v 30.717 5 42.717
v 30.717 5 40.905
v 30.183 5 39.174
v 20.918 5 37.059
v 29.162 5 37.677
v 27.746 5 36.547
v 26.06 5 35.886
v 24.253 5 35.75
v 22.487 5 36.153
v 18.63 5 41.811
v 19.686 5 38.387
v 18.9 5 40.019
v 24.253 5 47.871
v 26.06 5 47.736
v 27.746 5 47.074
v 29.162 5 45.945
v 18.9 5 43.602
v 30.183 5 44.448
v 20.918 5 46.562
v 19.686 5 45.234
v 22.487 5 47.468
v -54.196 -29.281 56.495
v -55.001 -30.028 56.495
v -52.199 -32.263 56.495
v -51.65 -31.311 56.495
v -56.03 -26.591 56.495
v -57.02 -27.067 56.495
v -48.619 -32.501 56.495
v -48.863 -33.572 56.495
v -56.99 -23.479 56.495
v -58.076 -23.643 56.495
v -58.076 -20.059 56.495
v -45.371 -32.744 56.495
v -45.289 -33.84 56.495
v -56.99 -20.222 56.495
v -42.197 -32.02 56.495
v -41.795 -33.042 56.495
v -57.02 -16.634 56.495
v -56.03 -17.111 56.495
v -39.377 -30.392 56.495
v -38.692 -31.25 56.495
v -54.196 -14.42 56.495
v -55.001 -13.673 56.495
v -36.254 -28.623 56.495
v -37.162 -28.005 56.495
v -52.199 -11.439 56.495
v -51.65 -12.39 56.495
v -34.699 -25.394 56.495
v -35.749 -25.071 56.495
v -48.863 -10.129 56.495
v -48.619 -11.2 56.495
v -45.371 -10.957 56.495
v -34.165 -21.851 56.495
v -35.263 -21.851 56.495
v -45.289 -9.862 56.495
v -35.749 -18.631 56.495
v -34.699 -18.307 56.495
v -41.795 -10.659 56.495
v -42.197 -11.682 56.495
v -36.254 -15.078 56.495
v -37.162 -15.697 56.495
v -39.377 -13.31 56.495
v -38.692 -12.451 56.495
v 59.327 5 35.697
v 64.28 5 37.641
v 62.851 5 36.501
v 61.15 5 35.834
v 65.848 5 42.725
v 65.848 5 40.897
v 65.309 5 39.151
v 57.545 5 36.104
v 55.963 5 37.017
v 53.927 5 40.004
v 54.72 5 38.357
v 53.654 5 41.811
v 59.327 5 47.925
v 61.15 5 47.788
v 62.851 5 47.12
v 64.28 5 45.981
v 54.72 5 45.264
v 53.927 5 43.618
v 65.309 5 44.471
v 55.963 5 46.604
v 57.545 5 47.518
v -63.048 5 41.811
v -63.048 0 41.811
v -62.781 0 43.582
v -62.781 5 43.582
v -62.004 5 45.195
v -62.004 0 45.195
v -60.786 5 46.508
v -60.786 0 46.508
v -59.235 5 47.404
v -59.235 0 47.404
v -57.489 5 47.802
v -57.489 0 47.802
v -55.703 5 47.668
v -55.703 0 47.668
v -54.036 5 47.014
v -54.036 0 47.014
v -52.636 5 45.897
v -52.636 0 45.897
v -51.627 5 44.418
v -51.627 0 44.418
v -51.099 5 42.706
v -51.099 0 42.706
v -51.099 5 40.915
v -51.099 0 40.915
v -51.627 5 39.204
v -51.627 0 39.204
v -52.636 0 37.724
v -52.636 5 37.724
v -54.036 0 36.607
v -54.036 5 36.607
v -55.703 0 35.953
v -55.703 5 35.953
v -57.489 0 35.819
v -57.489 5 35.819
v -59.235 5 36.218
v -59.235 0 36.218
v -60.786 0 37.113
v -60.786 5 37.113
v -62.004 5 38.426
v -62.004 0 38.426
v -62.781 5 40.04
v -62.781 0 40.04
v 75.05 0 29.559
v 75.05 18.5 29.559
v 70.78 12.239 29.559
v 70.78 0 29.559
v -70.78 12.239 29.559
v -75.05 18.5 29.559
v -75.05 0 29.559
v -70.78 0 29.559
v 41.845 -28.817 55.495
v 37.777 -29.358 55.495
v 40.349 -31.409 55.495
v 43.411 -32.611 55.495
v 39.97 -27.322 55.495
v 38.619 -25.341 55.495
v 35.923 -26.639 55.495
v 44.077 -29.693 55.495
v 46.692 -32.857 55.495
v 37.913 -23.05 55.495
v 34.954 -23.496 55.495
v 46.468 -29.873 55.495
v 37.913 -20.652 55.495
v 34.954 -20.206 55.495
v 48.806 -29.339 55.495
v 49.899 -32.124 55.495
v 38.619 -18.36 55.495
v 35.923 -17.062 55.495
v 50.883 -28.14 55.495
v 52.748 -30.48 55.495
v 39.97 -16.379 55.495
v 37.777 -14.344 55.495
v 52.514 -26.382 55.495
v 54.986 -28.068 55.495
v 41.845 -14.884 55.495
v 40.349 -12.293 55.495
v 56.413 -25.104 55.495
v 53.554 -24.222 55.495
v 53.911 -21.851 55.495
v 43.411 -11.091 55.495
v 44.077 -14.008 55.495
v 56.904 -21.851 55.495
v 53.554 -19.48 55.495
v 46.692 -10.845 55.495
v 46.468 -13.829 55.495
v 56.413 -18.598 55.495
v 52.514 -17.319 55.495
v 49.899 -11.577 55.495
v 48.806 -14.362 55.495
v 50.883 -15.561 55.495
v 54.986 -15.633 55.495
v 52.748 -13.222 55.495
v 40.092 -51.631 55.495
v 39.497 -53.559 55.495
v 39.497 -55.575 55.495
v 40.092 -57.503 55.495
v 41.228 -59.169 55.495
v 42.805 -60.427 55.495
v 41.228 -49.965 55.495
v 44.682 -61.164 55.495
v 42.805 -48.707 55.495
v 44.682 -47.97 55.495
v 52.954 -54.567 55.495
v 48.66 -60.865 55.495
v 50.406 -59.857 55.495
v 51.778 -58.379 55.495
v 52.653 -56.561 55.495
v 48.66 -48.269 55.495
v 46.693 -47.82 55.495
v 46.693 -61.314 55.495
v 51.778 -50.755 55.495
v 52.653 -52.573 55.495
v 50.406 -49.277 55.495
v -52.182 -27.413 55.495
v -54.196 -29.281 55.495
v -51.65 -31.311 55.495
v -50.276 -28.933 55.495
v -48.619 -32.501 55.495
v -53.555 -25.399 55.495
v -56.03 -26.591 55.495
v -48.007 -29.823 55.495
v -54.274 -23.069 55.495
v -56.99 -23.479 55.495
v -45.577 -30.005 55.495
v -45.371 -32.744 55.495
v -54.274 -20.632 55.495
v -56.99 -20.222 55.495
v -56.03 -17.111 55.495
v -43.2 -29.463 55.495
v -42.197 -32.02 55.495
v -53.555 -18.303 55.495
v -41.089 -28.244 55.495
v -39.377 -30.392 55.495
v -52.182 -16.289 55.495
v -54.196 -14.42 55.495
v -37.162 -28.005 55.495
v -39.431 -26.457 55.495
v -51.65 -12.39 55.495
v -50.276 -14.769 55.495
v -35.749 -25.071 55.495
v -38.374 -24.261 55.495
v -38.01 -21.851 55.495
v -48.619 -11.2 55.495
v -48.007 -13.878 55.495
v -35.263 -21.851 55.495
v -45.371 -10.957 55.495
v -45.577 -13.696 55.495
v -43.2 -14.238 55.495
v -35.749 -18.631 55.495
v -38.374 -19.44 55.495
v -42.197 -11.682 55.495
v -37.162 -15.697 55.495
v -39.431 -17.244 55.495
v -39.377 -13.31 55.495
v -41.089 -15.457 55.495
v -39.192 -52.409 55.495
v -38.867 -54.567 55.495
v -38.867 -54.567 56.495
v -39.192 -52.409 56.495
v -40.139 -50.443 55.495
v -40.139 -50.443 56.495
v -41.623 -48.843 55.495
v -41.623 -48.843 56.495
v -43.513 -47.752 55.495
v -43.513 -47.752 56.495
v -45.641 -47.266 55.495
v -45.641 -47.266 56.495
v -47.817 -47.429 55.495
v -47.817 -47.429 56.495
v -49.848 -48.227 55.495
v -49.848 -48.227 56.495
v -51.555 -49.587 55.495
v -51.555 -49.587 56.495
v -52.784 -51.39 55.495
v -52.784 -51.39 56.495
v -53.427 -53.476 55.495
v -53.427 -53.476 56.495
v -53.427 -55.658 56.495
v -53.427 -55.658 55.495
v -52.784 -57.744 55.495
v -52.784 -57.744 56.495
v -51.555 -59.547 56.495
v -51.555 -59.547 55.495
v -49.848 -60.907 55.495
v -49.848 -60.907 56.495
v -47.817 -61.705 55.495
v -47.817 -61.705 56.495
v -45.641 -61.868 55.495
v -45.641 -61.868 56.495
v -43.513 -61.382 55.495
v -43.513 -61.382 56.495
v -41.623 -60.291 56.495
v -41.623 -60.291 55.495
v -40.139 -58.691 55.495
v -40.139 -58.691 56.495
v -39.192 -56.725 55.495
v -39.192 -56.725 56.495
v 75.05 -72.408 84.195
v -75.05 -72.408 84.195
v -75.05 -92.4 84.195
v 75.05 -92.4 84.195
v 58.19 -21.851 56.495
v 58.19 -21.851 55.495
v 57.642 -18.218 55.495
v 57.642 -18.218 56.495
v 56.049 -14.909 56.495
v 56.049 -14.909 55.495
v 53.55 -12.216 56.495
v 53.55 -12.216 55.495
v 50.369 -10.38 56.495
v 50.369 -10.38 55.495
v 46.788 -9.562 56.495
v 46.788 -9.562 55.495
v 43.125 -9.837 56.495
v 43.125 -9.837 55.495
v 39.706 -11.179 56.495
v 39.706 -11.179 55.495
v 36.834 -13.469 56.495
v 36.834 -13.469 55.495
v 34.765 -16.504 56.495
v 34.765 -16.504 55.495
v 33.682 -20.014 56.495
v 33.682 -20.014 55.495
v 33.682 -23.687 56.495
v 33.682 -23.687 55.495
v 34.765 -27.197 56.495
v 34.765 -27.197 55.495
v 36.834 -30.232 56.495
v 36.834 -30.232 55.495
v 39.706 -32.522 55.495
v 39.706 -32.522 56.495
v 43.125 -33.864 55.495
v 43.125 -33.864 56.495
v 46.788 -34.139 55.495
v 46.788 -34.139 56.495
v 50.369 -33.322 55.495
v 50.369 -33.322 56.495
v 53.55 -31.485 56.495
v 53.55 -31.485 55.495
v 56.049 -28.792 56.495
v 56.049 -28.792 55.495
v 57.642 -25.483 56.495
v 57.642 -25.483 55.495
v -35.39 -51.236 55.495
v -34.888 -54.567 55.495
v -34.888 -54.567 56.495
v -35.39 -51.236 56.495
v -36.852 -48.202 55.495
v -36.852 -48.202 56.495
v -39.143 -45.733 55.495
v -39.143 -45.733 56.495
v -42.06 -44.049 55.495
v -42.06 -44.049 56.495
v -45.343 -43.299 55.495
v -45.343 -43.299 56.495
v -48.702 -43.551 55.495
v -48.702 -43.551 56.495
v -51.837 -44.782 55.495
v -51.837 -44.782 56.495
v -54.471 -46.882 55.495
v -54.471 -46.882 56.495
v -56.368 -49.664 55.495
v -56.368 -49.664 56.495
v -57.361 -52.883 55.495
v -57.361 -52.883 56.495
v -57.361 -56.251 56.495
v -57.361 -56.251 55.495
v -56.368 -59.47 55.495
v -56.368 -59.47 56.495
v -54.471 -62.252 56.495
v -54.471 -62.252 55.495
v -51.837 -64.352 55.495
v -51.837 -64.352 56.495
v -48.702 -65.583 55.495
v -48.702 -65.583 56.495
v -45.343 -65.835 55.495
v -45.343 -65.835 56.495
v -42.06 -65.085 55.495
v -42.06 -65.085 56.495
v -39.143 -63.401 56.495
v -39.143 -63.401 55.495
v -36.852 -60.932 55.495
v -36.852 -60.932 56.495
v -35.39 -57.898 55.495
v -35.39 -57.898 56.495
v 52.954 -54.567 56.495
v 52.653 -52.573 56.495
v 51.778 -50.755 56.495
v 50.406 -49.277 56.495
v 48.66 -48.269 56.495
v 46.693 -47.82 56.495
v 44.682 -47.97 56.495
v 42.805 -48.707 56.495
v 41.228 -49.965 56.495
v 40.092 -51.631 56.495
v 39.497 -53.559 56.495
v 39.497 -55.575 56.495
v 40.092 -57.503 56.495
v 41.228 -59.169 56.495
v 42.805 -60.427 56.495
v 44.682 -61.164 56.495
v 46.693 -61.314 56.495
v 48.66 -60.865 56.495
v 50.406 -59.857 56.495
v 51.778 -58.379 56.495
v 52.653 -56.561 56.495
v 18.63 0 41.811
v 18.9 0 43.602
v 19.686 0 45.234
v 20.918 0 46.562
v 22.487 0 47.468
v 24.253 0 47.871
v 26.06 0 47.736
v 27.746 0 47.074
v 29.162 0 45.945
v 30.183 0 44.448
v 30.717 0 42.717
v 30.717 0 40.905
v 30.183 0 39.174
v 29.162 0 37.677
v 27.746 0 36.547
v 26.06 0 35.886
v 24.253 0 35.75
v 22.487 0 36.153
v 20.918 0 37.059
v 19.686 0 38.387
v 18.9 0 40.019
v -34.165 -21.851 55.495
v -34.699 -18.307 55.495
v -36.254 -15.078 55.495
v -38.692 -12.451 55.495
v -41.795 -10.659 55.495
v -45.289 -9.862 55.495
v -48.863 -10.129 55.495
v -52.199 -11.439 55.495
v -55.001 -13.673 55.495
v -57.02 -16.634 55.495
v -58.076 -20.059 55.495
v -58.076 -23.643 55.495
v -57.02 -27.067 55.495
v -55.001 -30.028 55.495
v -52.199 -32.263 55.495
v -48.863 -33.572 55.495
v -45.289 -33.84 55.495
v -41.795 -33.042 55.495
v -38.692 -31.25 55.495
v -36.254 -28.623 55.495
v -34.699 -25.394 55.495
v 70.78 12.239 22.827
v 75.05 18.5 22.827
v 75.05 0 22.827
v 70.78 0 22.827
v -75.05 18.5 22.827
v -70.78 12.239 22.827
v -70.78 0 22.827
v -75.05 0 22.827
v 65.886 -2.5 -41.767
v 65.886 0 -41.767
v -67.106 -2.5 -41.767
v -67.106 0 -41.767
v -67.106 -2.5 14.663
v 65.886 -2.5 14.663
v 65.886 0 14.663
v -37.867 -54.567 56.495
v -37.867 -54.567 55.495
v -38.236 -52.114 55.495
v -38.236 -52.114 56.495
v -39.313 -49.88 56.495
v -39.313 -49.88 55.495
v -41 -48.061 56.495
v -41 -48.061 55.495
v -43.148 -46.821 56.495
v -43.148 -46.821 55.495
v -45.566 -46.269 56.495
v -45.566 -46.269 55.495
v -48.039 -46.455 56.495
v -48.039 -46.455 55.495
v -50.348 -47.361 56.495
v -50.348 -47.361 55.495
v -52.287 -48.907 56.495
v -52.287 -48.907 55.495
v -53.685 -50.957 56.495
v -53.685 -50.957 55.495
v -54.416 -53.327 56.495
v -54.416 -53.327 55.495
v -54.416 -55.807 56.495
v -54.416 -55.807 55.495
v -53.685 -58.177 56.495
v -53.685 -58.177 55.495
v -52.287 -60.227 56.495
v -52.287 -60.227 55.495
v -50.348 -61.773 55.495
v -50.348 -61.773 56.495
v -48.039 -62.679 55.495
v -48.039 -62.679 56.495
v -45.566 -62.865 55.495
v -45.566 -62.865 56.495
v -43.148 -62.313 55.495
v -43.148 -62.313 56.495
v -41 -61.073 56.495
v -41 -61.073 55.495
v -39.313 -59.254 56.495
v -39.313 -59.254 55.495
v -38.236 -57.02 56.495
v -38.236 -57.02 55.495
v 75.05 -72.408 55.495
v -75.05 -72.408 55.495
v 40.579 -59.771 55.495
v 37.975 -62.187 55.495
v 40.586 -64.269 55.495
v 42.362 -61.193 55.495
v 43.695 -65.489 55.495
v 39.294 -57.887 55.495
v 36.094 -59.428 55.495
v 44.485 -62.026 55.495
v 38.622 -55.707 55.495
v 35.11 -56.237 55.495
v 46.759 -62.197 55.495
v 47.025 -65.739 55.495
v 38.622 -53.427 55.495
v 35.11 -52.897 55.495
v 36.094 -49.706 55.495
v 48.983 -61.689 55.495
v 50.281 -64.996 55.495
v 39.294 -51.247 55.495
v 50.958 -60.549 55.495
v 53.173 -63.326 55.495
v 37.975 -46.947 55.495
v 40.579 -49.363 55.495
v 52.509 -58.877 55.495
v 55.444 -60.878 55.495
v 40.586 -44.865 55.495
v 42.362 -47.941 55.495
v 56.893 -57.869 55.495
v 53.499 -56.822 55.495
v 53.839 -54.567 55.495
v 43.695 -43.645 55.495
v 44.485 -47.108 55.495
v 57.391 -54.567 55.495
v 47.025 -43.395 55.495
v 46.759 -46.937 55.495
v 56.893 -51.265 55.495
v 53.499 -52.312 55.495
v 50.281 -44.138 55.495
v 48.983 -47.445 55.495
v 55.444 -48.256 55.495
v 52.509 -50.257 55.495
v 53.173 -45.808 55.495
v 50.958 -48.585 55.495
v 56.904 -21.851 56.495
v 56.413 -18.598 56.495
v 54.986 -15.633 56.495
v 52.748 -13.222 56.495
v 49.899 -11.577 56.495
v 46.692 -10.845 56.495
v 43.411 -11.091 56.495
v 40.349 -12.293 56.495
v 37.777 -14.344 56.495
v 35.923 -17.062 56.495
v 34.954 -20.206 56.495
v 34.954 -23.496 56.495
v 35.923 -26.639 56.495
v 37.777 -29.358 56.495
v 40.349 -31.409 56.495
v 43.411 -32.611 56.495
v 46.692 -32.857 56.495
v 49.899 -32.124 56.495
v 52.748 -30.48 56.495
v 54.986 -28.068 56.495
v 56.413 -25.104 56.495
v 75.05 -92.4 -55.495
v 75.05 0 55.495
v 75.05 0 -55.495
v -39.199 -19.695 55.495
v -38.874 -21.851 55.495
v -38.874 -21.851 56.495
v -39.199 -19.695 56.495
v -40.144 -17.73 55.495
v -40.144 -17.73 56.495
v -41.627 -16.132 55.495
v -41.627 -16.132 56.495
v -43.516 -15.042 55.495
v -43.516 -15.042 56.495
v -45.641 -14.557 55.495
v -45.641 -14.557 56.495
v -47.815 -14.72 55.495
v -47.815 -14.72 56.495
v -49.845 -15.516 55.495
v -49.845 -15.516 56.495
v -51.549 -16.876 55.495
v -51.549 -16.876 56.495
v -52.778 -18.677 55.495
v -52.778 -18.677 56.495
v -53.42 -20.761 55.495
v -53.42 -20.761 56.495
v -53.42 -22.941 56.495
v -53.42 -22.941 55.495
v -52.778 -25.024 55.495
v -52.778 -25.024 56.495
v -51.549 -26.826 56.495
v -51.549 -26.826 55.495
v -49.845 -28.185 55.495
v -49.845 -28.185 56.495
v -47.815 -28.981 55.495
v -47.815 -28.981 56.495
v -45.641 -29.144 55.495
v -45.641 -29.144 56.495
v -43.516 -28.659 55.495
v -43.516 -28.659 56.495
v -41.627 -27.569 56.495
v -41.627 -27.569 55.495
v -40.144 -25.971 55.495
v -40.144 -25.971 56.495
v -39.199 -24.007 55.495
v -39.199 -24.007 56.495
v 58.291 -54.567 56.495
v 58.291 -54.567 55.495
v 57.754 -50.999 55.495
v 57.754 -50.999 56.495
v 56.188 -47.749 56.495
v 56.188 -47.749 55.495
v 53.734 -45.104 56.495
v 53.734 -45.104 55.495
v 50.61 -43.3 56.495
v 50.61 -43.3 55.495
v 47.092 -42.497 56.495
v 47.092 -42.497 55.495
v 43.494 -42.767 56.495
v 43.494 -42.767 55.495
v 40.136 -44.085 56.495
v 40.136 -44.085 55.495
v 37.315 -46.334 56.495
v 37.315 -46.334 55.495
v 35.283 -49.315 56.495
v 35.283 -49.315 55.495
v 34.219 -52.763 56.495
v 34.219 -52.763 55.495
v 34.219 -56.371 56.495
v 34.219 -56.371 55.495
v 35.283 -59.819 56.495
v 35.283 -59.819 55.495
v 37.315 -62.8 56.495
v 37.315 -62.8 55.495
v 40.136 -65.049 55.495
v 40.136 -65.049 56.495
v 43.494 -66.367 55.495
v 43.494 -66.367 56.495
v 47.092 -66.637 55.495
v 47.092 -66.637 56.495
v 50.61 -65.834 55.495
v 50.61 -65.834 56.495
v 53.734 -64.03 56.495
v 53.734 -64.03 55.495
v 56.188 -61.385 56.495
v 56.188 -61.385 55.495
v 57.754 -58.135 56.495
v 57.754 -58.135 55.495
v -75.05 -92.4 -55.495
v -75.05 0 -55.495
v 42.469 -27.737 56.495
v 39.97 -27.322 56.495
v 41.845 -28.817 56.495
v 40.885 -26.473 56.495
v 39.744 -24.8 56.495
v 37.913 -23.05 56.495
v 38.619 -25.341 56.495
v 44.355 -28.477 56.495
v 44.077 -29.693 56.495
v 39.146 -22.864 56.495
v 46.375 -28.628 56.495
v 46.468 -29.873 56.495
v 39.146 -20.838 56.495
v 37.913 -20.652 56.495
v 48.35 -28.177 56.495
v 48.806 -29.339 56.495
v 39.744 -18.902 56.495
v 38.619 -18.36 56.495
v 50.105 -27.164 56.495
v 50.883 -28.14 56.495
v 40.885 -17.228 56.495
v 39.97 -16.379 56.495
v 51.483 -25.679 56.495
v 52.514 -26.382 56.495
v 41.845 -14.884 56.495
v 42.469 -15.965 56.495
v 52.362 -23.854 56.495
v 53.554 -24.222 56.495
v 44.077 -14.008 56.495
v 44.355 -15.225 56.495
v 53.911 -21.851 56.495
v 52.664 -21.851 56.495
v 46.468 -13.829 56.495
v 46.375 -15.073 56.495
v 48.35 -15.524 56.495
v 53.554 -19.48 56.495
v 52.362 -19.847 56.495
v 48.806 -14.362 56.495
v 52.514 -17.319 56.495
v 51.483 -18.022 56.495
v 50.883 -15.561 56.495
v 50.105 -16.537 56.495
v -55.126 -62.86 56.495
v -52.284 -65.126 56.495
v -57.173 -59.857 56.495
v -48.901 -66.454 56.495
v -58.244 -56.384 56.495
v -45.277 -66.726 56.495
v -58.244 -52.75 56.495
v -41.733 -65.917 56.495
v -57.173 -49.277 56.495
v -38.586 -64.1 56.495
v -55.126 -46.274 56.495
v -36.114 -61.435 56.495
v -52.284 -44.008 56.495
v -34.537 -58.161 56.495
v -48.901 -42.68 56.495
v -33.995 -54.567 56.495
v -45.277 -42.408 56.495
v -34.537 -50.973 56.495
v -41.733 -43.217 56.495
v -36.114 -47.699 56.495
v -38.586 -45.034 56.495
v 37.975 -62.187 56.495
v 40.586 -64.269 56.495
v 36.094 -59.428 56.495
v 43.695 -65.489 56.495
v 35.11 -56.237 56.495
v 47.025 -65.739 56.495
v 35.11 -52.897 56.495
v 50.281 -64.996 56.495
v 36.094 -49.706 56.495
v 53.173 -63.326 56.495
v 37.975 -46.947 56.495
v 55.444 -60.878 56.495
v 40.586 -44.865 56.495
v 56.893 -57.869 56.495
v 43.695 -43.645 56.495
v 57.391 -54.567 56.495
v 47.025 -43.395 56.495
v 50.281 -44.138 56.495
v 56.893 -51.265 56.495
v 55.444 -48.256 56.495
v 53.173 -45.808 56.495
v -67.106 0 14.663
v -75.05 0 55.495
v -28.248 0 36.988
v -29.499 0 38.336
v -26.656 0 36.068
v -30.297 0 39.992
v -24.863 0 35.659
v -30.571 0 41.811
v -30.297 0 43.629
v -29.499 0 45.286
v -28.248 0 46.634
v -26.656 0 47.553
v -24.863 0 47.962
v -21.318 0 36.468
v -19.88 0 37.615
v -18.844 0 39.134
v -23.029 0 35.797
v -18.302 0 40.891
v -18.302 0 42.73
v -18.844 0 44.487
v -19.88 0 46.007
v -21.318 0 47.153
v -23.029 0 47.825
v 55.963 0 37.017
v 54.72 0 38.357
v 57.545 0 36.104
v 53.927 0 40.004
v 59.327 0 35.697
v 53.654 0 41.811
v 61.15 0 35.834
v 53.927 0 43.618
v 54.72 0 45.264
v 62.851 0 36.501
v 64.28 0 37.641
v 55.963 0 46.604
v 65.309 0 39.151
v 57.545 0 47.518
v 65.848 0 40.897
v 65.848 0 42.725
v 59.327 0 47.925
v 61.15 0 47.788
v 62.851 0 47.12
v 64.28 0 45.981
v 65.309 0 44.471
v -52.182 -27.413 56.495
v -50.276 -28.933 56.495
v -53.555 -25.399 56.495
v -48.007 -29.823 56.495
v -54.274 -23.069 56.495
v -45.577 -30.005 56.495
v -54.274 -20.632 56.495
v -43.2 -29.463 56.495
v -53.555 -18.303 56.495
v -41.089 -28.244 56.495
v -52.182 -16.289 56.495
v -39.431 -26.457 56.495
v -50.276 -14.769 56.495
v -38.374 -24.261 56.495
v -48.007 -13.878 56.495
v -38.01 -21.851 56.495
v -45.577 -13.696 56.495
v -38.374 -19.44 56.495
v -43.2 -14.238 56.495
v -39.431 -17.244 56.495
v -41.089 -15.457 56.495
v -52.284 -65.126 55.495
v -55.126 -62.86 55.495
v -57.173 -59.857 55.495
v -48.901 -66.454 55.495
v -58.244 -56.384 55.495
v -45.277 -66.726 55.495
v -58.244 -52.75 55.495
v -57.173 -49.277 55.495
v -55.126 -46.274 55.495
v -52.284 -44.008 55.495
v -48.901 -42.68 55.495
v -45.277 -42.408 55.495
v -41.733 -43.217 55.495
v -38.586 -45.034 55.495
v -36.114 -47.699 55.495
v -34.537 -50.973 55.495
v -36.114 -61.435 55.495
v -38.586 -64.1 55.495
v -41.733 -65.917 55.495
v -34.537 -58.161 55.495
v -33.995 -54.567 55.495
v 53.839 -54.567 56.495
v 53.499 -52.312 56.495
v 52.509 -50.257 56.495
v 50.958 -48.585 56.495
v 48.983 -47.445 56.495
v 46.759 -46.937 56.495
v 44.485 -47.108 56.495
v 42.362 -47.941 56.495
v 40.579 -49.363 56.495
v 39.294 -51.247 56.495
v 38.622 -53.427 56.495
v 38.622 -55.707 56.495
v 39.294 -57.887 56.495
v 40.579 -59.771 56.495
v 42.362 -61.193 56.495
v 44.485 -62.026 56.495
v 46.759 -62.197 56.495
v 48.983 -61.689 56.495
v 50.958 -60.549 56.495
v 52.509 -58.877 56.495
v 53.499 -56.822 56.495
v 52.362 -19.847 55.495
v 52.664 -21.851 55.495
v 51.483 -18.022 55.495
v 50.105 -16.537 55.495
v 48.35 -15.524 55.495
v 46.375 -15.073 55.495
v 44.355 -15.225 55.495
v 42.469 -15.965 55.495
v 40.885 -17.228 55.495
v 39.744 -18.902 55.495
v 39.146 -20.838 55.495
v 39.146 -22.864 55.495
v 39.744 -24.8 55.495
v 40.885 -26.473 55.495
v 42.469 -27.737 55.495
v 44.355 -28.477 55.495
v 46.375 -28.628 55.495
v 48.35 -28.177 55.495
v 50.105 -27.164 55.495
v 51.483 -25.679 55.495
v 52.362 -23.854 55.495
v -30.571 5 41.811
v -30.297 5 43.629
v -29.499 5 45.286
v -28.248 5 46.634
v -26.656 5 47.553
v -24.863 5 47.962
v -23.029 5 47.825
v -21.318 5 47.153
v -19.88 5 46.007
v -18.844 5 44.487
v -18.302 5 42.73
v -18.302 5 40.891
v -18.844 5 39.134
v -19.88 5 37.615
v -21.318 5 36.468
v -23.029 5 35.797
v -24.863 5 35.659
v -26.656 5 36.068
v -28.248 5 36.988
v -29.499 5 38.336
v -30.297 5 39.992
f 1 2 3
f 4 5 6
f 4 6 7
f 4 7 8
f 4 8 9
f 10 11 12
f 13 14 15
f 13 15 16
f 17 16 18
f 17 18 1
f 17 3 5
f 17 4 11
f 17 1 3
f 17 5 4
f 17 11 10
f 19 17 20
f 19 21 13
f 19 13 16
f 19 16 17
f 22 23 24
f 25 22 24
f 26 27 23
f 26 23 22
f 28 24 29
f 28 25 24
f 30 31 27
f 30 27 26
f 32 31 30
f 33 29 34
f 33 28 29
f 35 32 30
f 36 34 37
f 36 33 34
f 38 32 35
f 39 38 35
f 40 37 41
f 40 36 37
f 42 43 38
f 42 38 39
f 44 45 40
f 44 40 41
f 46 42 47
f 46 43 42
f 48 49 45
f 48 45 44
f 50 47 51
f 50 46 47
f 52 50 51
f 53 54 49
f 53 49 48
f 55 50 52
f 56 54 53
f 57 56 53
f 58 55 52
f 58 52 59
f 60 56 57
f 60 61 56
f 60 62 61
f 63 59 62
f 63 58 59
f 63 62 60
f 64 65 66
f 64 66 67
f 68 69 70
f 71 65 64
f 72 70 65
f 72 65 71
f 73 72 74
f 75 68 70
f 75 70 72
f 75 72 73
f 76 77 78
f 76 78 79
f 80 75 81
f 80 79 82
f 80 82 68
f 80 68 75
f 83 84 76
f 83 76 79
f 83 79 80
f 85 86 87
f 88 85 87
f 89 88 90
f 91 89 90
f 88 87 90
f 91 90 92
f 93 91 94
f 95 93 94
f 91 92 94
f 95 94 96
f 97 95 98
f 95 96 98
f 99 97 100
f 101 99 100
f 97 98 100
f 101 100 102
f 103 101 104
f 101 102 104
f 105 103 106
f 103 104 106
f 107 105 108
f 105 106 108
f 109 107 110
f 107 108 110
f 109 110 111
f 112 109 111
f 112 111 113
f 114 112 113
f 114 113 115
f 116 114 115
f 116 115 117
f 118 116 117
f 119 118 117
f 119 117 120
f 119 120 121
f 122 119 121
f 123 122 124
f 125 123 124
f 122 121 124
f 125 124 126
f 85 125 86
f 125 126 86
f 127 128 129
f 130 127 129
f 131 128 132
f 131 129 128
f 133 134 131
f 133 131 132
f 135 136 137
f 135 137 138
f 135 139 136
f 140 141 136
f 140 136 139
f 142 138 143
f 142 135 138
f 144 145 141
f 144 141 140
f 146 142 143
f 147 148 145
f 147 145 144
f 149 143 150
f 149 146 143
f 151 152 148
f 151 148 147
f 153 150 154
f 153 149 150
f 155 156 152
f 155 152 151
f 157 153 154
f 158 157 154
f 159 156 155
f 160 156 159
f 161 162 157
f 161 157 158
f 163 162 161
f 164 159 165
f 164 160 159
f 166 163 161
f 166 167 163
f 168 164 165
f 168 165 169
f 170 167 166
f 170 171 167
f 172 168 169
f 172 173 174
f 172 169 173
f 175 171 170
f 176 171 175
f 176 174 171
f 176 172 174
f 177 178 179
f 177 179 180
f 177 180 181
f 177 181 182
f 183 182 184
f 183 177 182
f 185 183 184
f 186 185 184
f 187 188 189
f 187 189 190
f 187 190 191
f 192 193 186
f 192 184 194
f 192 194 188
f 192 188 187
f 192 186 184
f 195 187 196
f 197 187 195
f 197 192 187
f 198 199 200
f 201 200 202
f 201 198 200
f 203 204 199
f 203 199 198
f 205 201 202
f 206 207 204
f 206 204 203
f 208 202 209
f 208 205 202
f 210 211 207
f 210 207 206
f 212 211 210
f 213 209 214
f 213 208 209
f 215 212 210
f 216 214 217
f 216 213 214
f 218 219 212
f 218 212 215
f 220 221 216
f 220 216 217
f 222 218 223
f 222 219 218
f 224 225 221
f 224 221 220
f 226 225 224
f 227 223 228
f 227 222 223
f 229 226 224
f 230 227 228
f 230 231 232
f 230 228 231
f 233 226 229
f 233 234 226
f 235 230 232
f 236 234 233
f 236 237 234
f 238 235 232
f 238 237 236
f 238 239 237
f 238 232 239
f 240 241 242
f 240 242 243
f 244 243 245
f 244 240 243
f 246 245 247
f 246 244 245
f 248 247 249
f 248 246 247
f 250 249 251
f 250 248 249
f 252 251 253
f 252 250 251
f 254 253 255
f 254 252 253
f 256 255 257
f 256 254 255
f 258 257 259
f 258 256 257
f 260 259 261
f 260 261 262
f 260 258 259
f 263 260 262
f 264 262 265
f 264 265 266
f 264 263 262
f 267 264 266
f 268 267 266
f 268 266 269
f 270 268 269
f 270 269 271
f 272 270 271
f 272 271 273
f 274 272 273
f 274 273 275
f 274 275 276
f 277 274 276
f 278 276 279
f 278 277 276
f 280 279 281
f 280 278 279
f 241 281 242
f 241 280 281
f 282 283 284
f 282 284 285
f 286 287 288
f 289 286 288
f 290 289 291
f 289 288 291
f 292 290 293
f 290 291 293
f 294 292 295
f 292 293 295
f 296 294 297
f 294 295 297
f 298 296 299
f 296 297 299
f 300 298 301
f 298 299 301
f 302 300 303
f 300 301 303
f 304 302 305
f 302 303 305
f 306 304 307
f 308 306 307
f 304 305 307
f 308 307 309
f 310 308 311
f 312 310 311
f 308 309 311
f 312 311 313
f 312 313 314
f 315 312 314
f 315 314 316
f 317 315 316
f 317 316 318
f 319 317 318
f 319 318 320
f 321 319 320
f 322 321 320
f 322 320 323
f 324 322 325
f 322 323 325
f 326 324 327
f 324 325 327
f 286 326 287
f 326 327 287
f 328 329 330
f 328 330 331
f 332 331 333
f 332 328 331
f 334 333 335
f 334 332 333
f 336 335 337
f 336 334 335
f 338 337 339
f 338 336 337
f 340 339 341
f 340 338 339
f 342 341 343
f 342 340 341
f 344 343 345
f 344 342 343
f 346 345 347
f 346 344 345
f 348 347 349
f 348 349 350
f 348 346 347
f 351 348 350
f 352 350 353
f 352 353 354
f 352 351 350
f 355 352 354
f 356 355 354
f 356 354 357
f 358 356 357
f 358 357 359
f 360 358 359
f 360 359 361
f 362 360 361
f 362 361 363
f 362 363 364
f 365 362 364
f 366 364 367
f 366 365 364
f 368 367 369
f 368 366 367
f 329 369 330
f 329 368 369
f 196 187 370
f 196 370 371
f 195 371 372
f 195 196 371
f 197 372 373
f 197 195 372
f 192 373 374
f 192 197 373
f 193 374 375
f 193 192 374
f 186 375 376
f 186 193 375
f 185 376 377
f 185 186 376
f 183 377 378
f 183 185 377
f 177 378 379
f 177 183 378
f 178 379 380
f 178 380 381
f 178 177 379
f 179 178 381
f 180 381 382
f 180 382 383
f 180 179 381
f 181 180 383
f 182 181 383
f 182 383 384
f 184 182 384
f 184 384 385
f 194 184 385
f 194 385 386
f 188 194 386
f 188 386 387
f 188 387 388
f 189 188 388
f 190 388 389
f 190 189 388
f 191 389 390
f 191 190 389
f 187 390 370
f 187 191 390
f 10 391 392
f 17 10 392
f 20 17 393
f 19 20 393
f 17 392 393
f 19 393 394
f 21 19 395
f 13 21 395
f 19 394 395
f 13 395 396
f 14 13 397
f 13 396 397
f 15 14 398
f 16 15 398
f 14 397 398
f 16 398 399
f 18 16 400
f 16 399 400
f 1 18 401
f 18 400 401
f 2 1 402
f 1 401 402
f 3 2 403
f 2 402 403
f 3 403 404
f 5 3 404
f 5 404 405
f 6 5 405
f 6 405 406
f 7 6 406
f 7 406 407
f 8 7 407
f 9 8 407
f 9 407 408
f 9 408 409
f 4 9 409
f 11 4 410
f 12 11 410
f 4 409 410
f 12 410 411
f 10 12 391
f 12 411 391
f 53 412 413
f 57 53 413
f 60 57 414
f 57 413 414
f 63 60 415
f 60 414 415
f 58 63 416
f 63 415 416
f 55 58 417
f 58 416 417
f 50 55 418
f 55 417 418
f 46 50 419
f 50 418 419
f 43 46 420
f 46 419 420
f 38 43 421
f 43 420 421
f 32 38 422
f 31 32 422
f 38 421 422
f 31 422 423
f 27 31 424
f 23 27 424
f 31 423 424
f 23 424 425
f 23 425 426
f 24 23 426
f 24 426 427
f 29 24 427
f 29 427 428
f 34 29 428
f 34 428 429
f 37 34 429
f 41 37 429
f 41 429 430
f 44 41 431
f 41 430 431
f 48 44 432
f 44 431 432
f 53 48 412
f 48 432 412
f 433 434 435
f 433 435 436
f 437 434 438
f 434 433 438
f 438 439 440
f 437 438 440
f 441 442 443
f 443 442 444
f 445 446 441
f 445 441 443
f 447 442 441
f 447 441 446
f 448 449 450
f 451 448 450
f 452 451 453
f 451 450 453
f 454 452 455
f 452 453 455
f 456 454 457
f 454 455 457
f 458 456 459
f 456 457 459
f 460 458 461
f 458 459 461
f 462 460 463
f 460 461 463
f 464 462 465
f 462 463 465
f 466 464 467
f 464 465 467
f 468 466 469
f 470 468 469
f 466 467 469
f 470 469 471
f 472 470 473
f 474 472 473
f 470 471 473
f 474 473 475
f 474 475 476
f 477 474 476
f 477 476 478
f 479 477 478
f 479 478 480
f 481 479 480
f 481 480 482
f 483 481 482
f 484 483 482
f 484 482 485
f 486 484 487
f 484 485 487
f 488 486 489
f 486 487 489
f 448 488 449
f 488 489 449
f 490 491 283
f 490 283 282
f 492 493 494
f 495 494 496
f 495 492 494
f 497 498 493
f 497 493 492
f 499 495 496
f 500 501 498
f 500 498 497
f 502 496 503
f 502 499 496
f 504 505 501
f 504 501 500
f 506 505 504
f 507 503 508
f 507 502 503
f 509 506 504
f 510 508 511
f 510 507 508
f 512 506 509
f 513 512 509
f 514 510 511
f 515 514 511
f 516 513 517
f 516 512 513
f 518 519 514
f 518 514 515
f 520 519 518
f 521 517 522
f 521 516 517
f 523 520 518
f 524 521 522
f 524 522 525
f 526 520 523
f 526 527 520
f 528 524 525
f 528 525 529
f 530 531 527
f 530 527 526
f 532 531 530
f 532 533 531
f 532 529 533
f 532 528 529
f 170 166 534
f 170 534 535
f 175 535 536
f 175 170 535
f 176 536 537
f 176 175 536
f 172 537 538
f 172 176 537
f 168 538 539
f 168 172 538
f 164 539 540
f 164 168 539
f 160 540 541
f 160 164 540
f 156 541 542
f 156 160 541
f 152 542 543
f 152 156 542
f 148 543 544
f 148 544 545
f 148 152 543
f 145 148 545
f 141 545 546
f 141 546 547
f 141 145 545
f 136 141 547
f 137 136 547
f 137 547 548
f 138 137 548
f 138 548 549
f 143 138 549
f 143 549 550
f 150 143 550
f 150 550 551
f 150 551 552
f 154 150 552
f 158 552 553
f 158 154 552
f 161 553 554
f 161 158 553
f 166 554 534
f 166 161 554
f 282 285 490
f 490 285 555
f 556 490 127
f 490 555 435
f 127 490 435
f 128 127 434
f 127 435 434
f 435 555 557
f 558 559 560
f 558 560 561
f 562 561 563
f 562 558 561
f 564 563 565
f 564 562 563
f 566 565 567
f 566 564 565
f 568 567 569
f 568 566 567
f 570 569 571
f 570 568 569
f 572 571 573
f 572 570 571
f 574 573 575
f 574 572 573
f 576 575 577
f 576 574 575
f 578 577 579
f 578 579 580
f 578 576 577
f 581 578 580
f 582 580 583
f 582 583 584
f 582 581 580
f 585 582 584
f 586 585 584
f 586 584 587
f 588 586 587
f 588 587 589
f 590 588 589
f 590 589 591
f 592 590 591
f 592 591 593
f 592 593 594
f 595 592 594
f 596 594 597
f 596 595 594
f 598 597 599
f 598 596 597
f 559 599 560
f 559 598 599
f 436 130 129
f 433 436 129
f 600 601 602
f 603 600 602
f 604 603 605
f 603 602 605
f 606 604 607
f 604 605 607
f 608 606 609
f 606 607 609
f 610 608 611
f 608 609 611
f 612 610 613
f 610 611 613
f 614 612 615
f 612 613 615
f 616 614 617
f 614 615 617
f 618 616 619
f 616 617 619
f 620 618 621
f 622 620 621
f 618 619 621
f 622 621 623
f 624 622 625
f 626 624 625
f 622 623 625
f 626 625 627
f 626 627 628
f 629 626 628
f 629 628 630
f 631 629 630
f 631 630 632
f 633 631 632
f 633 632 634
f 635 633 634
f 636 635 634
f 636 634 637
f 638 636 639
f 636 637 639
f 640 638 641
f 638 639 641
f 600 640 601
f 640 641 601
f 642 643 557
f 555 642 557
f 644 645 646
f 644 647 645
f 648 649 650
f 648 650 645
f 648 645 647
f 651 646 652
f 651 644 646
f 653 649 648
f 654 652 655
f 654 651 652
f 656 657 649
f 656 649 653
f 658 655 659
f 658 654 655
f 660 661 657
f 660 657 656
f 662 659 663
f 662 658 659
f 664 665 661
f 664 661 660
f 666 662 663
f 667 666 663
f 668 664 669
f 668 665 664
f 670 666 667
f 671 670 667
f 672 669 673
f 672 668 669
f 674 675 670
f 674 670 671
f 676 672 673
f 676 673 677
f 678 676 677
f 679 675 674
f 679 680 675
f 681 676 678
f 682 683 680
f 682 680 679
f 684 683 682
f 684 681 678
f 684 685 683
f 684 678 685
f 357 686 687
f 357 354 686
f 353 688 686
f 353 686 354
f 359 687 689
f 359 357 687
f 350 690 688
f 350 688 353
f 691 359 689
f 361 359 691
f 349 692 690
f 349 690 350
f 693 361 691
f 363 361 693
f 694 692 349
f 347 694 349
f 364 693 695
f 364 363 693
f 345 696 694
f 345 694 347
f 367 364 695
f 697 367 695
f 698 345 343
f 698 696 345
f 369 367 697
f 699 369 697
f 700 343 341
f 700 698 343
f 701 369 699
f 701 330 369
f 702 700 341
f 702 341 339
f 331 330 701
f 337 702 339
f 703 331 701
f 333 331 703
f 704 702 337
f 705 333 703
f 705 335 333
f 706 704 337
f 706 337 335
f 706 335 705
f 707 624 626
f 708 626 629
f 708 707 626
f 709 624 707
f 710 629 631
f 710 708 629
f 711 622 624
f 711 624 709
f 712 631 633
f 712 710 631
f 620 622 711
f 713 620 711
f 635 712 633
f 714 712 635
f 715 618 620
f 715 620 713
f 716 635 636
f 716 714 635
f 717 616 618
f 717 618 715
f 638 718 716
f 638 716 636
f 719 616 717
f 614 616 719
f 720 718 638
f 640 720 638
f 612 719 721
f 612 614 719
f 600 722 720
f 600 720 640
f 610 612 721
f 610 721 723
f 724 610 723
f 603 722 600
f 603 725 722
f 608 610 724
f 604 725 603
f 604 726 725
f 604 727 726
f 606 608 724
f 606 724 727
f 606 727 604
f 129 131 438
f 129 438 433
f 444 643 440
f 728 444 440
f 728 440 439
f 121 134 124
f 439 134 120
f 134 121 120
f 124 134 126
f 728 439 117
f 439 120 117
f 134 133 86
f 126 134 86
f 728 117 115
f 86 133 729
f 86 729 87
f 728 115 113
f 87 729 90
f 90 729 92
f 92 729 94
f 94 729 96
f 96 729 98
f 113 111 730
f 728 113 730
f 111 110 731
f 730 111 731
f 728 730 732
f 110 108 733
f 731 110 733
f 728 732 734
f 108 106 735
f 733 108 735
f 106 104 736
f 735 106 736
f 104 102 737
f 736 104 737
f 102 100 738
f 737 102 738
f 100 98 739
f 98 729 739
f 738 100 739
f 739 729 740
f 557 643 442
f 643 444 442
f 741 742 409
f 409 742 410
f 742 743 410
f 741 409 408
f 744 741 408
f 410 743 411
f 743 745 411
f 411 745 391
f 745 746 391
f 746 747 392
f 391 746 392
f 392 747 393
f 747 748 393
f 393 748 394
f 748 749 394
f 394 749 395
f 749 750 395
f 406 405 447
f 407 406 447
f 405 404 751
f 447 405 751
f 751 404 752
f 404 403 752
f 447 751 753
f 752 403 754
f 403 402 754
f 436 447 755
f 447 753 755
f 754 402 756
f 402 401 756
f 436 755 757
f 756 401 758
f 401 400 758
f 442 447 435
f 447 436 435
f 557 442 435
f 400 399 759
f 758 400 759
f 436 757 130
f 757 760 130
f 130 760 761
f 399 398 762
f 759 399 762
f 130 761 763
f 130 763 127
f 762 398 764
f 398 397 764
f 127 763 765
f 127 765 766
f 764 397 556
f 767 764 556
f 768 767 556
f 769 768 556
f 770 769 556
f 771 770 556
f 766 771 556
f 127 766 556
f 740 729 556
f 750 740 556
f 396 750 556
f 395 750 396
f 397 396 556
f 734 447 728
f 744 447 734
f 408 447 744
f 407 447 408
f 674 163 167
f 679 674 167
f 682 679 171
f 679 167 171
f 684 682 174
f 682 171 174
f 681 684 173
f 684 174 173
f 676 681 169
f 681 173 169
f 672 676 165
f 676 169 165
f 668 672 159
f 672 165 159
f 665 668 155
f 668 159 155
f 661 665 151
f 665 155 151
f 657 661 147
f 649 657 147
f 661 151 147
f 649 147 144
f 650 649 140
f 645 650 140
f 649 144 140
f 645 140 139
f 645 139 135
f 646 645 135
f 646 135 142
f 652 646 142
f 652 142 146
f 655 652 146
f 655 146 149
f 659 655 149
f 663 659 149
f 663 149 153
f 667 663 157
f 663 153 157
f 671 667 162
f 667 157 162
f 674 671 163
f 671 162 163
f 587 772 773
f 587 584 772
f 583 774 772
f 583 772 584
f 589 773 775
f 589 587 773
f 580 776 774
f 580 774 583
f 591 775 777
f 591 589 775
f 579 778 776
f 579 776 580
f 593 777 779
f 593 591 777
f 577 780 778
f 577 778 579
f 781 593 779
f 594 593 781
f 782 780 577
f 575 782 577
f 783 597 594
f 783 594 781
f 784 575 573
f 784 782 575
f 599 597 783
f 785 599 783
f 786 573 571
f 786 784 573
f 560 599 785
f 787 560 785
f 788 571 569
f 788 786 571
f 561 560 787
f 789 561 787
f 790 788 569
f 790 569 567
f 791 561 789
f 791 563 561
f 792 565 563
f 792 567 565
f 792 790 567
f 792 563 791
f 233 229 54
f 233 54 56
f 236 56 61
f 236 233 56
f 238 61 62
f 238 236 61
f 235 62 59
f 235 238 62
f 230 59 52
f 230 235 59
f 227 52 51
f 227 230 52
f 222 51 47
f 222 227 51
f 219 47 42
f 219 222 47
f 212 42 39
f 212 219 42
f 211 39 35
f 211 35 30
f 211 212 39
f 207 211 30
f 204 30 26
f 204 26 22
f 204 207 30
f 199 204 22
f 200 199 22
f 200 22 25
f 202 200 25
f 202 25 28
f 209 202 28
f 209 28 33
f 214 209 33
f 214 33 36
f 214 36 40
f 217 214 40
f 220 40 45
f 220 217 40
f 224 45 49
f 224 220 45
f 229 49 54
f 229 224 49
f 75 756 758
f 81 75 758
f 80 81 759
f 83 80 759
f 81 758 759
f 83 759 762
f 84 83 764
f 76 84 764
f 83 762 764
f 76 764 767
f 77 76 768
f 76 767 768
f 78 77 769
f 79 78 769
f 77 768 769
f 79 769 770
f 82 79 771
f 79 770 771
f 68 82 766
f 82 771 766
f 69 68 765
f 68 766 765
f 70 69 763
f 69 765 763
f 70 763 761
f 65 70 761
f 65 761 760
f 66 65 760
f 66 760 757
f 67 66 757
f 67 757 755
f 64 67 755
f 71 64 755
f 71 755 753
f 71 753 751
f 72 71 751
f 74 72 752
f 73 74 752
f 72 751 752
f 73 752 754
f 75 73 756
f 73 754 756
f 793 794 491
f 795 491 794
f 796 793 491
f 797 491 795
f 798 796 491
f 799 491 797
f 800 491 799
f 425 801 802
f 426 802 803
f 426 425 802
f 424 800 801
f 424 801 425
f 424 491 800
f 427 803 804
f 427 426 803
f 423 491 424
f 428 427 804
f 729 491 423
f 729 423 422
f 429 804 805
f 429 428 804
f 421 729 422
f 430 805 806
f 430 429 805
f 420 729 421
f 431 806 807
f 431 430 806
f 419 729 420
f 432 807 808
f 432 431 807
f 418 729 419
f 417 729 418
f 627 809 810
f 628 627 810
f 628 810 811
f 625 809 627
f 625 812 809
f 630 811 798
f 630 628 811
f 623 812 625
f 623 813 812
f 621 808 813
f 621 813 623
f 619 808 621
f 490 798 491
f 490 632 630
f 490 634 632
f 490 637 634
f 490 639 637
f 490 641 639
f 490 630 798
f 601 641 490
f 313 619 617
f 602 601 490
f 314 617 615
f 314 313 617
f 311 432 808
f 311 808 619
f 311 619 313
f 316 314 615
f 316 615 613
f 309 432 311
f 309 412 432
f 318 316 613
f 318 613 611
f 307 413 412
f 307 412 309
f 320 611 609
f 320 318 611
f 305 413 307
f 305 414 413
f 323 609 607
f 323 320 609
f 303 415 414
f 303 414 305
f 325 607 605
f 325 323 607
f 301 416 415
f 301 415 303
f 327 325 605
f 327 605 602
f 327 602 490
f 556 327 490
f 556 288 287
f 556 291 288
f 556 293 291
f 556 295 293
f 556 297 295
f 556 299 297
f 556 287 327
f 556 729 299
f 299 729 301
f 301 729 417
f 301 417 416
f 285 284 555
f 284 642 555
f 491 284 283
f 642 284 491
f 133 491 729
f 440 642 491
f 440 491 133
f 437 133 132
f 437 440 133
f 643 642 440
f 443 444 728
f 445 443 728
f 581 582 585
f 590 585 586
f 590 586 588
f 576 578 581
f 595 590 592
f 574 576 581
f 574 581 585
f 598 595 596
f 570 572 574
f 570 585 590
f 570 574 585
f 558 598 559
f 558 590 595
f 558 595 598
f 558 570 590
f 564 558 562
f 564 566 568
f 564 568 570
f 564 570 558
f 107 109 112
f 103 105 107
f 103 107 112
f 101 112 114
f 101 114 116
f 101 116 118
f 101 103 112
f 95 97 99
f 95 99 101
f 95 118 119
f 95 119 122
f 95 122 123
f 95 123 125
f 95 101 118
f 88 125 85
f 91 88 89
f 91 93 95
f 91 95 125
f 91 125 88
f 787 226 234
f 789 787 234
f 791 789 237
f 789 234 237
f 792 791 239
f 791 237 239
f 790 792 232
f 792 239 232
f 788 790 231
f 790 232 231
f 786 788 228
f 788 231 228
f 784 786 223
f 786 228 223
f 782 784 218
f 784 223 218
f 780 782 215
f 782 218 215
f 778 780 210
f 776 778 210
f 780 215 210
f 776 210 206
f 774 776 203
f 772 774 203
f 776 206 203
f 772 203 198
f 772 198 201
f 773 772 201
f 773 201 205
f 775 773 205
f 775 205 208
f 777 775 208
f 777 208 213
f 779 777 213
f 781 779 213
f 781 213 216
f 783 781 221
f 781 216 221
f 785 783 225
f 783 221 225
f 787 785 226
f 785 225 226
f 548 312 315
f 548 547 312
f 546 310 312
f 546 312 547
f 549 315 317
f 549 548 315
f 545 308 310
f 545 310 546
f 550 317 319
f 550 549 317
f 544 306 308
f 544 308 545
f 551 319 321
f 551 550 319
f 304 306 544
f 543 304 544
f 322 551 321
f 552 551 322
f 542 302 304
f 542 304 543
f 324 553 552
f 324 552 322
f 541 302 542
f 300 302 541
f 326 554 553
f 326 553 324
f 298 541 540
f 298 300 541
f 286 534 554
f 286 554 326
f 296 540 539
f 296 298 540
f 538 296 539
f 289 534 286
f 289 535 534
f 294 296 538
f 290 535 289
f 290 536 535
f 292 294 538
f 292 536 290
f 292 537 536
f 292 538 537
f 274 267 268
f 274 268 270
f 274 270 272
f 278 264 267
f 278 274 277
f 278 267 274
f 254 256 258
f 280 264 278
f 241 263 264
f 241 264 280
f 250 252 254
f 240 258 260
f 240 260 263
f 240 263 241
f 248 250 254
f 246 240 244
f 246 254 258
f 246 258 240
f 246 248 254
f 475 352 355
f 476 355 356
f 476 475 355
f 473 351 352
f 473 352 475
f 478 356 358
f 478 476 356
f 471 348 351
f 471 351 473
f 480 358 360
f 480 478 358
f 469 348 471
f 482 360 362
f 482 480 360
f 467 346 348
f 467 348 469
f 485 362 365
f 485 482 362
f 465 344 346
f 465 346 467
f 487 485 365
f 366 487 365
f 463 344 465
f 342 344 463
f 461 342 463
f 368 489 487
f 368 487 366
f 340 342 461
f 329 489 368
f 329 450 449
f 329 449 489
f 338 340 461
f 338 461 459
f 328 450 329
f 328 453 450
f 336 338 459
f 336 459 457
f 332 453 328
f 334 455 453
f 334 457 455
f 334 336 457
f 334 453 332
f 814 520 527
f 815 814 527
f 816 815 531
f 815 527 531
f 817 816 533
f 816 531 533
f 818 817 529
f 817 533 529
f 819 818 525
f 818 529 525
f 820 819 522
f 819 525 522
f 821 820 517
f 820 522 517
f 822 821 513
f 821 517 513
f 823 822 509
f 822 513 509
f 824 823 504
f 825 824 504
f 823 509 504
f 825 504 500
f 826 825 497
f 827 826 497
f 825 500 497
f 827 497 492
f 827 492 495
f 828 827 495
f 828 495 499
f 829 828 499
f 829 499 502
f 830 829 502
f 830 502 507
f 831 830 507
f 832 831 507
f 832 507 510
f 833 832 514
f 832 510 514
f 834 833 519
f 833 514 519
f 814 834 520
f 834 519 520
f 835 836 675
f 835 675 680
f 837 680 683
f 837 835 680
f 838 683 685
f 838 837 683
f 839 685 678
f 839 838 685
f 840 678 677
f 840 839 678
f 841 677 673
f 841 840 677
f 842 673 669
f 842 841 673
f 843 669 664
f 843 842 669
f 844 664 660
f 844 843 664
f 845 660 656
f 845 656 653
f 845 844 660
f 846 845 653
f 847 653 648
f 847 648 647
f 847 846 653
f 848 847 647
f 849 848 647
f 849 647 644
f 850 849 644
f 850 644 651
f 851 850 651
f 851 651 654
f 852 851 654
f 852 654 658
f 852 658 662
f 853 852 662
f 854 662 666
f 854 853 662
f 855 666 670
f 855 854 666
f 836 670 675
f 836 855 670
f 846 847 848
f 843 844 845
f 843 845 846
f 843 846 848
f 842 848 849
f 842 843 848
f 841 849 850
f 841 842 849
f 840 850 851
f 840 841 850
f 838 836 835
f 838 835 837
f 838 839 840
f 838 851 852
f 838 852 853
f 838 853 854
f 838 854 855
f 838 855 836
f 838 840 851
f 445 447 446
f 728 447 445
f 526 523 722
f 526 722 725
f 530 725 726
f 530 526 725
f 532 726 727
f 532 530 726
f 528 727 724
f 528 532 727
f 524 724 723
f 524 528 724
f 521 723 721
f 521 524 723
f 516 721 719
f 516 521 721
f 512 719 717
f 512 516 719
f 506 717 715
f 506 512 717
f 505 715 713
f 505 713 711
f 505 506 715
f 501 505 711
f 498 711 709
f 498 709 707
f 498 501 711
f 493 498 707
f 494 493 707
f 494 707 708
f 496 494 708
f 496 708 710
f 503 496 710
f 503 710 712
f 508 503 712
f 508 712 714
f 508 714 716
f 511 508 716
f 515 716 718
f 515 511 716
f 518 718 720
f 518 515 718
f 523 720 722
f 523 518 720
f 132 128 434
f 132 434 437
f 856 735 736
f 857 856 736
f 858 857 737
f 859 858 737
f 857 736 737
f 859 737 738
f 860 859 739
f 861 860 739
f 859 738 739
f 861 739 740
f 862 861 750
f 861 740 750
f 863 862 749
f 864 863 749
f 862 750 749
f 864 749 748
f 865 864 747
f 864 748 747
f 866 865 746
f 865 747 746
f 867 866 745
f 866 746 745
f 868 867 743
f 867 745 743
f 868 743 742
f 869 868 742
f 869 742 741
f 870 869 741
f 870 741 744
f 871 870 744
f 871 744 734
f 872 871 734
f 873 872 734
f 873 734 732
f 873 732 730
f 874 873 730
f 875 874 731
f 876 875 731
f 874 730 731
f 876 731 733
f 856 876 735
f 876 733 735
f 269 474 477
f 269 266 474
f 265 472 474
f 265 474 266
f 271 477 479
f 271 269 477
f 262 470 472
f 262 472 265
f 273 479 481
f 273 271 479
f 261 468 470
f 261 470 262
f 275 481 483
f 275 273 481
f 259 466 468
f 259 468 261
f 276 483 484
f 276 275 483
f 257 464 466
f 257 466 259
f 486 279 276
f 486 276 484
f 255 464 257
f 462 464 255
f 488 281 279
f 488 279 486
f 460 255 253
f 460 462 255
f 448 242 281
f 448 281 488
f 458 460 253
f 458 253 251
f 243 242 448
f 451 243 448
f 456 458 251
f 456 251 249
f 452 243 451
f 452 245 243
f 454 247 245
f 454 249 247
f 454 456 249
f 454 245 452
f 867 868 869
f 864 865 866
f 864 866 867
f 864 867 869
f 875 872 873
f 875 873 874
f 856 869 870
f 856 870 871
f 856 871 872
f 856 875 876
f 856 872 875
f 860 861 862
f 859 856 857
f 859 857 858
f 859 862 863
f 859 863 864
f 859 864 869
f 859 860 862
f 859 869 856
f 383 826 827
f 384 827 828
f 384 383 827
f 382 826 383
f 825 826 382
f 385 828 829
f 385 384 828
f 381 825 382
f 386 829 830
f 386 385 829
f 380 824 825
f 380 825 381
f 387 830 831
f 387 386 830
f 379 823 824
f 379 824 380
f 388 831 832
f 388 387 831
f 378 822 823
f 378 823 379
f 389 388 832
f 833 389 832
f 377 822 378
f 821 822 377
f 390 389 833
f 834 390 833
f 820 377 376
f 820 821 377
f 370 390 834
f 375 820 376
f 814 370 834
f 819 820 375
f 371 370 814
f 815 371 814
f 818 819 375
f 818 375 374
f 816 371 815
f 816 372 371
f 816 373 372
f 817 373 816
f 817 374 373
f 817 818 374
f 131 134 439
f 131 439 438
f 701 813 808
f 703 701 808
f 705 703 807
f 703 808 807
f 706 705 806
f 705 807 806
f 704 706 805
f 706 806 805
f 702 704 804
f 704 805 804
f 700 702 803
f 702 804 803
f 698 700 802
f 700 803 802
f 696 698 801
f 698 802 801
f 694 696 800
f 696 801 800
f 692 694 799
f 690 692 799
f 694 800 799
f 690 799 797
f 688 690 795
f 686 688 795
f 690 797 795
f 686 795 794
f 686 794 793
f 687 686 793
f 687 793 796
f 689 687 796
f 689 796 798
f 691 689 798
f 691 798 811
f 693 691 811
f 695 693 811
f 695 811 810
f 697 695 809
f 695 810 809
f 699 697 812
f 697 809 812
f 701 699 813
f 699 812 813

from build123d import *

# Parameters (mm, degrees)
F0_W      = 150.1006782055
F0_H      = 110.9899356961
F1_DEPTH  = 92.4
F2_W      = 150.1006782055
F2_H      = 19.9922849774
F3_DEPTH  = 28.7
F4_W      = 150.1006782055
F4_H      = 6.7310594022
F5_DEPTH  = 18.5
F6_W      = 141.5597423911
F6_H      = 12.2390463948
F7_DEPTH  = 9.7
F8_W      = 132.9917162657
F8_H      = 56.4299700782
F9_DEPTH  = 2.5
F10_R     = 6.077615329
F10_R_2   = 6.1309658988
F10_R_3   = 6.1687846494
F10_R_4   = 6.0083305598
F11_DEPTH = 5
F12_R     = 12.3227416523
F12_R_2   = 11.0367187647
F12_R_3   = 12.1926494199
F12_R_4   = 11.2992603937
F12_R_5   = 12.1037249709
F12_R_6   = 11.2032484042
F12_R_7   = 12.0227070788
F12_R_8   = 10.9242891597
F12_R_9   = 8.3209245573
F12_R_10  = 7.3212092862
F12_R_11  = 8.1775044527
F12_R_12  = 7.3141816182
F12_R_13  = 8.0443237324
F12_R_14  = 6.796531977
F12_R_15  = 7.6510346435
F12_R_16  = 6.7661892343
F13_DEPTH = 1


with BuildPart() as f1:
    # F0 (on Front) → F1 (new body)
    with BuildSketch(Plane.XZ):
        Rectangle(F0_W, F0_H)
    extrude(amount=F1_DEPTH)

    # F2 (on face) → F3 (join)
    with BuildSketch(Plane.XY.offset(55.4949678481)):
        with Locations((0, -82.4038575113)):
            Rectangle(F2_W, F2_H)
    extrude(amount=F3_DEPTH)

    # F4 (on face) → F5 (join)
    with BuildSketch(Plane(origin=(0, 0, 0), x_dir=(-1, 0, 0), z_dir=(0, 1, 0))):
        with Locations((0, 26.1929742992)):
            Rectangle(F4_W, F4_H)
    extrude(amount=F5_DEPTH)

    # F6 (on face) → F7 (cut)
    with BuildSketch(Plane.XY.offset(29.5585040003)):
        with Locations((3.7253e-06, 6.1195231974)):
            Rectangle(F6_W, F6_H)
    extrude(amount=-F7_DEPTH, mode=Mode.SUBTRACT)

    # F8 (on face) → F9 (cut)
    with BuildSketch(Plane(origin=(0, 0, 0), x_dir=(-1, 0, 0), z_dir=(0, 1, 0))):
        with Locations((0.6100535393, -13.5516175069)):
            Rectangle(F8_W, F8_H)
    extrude(amount=-F9_DEPTH, mode=Mode.SUBTRACT)

    # F10 (on face) → F11 (join)
    with BuildSketch(Plane(origin=(0, 0, 0), x_dir=(-1, 0, 0), z_dir=(0, 1, 0))):
        with Locations((-24.7071757913, 41.8107584119)):
            Circle(F10_R)
        with Locations((-59.7852654755, 41.8107584119)):
            Circle(F10_R_2)
        with Locations((24.4021452963, 41.8107584119)):
            Circle(F10_R_3)
        with Locations((57.0400170982, 41.8107584119)):
            Circle(F10_R_4)
    extrude(amount=F11_DEPTH)

    # F12 (on face) → F13 (join)
    with BuildSketch(Plane.XY.offset(55.4949678481)):
        with Locations((45.8669885993, -21.8506734818)):
            Circle(F12_R)
        with Locations((45.8669885993, -21.8506734818)):
            Circle(F12_R_2, mode=Mode.SUBTRACT)
        with Locations((-46.1877398193, -54.5669868588)):
            Circle(F12_R_3)
        with Locations((-46.1877398193, -54.5669868588)):
            Circle(F12_R_4, mode=Mode.SUBTRACT)
        with Locations((46.187736094, -54.5669868588)):
            Circle(F12_R_5)
        with Locations((46.187736094, -54.5669868588)):
            Circle(F12_R_6, mode=Mode.SUBTRACT)
        with Locations((-46.1877398193, -21.8506734818)):
            Circle(F12_R_7)
        with Locations((-46.1877398193, -21.8506734818)):
            Circle(F12_R_8, mode=Mode.SUBTRACT)
        with Locations((-46.1877398193, -54.5669868588)):
            Circle(F12_R_9)
        with Locations((-46.1877398193, -54.5669868588)):
            Circle(F12_R_10, mode=Mode.SUBTRACT)
        with Locations((-46.1877398193, -21.8506734818)):
            Circle(F12_R_11)
        with Locations((-46.1877398193, -21.8506734818)):
            Circle(F12_R_12, mode=Mode.SUBTRACT)
        with Locations((45.8669885993, -21.8506734818)):
            Circle(F12_R_13)
        with Locations((45.8669885993, -21.8506734818)):
            Circle(F12_R_14, mode=Mode.SUBTRACT)
        with Locations((46.187736094, -54.5669868588)):
            Circle(F12_R_15)
        with Locations((46.187736094, -54.5669868588)):
            Circle(F12_R_16, mode=Mode.SUBTRACT)
    extrude(amount=F13_DEPTH)


solid = f1.part
